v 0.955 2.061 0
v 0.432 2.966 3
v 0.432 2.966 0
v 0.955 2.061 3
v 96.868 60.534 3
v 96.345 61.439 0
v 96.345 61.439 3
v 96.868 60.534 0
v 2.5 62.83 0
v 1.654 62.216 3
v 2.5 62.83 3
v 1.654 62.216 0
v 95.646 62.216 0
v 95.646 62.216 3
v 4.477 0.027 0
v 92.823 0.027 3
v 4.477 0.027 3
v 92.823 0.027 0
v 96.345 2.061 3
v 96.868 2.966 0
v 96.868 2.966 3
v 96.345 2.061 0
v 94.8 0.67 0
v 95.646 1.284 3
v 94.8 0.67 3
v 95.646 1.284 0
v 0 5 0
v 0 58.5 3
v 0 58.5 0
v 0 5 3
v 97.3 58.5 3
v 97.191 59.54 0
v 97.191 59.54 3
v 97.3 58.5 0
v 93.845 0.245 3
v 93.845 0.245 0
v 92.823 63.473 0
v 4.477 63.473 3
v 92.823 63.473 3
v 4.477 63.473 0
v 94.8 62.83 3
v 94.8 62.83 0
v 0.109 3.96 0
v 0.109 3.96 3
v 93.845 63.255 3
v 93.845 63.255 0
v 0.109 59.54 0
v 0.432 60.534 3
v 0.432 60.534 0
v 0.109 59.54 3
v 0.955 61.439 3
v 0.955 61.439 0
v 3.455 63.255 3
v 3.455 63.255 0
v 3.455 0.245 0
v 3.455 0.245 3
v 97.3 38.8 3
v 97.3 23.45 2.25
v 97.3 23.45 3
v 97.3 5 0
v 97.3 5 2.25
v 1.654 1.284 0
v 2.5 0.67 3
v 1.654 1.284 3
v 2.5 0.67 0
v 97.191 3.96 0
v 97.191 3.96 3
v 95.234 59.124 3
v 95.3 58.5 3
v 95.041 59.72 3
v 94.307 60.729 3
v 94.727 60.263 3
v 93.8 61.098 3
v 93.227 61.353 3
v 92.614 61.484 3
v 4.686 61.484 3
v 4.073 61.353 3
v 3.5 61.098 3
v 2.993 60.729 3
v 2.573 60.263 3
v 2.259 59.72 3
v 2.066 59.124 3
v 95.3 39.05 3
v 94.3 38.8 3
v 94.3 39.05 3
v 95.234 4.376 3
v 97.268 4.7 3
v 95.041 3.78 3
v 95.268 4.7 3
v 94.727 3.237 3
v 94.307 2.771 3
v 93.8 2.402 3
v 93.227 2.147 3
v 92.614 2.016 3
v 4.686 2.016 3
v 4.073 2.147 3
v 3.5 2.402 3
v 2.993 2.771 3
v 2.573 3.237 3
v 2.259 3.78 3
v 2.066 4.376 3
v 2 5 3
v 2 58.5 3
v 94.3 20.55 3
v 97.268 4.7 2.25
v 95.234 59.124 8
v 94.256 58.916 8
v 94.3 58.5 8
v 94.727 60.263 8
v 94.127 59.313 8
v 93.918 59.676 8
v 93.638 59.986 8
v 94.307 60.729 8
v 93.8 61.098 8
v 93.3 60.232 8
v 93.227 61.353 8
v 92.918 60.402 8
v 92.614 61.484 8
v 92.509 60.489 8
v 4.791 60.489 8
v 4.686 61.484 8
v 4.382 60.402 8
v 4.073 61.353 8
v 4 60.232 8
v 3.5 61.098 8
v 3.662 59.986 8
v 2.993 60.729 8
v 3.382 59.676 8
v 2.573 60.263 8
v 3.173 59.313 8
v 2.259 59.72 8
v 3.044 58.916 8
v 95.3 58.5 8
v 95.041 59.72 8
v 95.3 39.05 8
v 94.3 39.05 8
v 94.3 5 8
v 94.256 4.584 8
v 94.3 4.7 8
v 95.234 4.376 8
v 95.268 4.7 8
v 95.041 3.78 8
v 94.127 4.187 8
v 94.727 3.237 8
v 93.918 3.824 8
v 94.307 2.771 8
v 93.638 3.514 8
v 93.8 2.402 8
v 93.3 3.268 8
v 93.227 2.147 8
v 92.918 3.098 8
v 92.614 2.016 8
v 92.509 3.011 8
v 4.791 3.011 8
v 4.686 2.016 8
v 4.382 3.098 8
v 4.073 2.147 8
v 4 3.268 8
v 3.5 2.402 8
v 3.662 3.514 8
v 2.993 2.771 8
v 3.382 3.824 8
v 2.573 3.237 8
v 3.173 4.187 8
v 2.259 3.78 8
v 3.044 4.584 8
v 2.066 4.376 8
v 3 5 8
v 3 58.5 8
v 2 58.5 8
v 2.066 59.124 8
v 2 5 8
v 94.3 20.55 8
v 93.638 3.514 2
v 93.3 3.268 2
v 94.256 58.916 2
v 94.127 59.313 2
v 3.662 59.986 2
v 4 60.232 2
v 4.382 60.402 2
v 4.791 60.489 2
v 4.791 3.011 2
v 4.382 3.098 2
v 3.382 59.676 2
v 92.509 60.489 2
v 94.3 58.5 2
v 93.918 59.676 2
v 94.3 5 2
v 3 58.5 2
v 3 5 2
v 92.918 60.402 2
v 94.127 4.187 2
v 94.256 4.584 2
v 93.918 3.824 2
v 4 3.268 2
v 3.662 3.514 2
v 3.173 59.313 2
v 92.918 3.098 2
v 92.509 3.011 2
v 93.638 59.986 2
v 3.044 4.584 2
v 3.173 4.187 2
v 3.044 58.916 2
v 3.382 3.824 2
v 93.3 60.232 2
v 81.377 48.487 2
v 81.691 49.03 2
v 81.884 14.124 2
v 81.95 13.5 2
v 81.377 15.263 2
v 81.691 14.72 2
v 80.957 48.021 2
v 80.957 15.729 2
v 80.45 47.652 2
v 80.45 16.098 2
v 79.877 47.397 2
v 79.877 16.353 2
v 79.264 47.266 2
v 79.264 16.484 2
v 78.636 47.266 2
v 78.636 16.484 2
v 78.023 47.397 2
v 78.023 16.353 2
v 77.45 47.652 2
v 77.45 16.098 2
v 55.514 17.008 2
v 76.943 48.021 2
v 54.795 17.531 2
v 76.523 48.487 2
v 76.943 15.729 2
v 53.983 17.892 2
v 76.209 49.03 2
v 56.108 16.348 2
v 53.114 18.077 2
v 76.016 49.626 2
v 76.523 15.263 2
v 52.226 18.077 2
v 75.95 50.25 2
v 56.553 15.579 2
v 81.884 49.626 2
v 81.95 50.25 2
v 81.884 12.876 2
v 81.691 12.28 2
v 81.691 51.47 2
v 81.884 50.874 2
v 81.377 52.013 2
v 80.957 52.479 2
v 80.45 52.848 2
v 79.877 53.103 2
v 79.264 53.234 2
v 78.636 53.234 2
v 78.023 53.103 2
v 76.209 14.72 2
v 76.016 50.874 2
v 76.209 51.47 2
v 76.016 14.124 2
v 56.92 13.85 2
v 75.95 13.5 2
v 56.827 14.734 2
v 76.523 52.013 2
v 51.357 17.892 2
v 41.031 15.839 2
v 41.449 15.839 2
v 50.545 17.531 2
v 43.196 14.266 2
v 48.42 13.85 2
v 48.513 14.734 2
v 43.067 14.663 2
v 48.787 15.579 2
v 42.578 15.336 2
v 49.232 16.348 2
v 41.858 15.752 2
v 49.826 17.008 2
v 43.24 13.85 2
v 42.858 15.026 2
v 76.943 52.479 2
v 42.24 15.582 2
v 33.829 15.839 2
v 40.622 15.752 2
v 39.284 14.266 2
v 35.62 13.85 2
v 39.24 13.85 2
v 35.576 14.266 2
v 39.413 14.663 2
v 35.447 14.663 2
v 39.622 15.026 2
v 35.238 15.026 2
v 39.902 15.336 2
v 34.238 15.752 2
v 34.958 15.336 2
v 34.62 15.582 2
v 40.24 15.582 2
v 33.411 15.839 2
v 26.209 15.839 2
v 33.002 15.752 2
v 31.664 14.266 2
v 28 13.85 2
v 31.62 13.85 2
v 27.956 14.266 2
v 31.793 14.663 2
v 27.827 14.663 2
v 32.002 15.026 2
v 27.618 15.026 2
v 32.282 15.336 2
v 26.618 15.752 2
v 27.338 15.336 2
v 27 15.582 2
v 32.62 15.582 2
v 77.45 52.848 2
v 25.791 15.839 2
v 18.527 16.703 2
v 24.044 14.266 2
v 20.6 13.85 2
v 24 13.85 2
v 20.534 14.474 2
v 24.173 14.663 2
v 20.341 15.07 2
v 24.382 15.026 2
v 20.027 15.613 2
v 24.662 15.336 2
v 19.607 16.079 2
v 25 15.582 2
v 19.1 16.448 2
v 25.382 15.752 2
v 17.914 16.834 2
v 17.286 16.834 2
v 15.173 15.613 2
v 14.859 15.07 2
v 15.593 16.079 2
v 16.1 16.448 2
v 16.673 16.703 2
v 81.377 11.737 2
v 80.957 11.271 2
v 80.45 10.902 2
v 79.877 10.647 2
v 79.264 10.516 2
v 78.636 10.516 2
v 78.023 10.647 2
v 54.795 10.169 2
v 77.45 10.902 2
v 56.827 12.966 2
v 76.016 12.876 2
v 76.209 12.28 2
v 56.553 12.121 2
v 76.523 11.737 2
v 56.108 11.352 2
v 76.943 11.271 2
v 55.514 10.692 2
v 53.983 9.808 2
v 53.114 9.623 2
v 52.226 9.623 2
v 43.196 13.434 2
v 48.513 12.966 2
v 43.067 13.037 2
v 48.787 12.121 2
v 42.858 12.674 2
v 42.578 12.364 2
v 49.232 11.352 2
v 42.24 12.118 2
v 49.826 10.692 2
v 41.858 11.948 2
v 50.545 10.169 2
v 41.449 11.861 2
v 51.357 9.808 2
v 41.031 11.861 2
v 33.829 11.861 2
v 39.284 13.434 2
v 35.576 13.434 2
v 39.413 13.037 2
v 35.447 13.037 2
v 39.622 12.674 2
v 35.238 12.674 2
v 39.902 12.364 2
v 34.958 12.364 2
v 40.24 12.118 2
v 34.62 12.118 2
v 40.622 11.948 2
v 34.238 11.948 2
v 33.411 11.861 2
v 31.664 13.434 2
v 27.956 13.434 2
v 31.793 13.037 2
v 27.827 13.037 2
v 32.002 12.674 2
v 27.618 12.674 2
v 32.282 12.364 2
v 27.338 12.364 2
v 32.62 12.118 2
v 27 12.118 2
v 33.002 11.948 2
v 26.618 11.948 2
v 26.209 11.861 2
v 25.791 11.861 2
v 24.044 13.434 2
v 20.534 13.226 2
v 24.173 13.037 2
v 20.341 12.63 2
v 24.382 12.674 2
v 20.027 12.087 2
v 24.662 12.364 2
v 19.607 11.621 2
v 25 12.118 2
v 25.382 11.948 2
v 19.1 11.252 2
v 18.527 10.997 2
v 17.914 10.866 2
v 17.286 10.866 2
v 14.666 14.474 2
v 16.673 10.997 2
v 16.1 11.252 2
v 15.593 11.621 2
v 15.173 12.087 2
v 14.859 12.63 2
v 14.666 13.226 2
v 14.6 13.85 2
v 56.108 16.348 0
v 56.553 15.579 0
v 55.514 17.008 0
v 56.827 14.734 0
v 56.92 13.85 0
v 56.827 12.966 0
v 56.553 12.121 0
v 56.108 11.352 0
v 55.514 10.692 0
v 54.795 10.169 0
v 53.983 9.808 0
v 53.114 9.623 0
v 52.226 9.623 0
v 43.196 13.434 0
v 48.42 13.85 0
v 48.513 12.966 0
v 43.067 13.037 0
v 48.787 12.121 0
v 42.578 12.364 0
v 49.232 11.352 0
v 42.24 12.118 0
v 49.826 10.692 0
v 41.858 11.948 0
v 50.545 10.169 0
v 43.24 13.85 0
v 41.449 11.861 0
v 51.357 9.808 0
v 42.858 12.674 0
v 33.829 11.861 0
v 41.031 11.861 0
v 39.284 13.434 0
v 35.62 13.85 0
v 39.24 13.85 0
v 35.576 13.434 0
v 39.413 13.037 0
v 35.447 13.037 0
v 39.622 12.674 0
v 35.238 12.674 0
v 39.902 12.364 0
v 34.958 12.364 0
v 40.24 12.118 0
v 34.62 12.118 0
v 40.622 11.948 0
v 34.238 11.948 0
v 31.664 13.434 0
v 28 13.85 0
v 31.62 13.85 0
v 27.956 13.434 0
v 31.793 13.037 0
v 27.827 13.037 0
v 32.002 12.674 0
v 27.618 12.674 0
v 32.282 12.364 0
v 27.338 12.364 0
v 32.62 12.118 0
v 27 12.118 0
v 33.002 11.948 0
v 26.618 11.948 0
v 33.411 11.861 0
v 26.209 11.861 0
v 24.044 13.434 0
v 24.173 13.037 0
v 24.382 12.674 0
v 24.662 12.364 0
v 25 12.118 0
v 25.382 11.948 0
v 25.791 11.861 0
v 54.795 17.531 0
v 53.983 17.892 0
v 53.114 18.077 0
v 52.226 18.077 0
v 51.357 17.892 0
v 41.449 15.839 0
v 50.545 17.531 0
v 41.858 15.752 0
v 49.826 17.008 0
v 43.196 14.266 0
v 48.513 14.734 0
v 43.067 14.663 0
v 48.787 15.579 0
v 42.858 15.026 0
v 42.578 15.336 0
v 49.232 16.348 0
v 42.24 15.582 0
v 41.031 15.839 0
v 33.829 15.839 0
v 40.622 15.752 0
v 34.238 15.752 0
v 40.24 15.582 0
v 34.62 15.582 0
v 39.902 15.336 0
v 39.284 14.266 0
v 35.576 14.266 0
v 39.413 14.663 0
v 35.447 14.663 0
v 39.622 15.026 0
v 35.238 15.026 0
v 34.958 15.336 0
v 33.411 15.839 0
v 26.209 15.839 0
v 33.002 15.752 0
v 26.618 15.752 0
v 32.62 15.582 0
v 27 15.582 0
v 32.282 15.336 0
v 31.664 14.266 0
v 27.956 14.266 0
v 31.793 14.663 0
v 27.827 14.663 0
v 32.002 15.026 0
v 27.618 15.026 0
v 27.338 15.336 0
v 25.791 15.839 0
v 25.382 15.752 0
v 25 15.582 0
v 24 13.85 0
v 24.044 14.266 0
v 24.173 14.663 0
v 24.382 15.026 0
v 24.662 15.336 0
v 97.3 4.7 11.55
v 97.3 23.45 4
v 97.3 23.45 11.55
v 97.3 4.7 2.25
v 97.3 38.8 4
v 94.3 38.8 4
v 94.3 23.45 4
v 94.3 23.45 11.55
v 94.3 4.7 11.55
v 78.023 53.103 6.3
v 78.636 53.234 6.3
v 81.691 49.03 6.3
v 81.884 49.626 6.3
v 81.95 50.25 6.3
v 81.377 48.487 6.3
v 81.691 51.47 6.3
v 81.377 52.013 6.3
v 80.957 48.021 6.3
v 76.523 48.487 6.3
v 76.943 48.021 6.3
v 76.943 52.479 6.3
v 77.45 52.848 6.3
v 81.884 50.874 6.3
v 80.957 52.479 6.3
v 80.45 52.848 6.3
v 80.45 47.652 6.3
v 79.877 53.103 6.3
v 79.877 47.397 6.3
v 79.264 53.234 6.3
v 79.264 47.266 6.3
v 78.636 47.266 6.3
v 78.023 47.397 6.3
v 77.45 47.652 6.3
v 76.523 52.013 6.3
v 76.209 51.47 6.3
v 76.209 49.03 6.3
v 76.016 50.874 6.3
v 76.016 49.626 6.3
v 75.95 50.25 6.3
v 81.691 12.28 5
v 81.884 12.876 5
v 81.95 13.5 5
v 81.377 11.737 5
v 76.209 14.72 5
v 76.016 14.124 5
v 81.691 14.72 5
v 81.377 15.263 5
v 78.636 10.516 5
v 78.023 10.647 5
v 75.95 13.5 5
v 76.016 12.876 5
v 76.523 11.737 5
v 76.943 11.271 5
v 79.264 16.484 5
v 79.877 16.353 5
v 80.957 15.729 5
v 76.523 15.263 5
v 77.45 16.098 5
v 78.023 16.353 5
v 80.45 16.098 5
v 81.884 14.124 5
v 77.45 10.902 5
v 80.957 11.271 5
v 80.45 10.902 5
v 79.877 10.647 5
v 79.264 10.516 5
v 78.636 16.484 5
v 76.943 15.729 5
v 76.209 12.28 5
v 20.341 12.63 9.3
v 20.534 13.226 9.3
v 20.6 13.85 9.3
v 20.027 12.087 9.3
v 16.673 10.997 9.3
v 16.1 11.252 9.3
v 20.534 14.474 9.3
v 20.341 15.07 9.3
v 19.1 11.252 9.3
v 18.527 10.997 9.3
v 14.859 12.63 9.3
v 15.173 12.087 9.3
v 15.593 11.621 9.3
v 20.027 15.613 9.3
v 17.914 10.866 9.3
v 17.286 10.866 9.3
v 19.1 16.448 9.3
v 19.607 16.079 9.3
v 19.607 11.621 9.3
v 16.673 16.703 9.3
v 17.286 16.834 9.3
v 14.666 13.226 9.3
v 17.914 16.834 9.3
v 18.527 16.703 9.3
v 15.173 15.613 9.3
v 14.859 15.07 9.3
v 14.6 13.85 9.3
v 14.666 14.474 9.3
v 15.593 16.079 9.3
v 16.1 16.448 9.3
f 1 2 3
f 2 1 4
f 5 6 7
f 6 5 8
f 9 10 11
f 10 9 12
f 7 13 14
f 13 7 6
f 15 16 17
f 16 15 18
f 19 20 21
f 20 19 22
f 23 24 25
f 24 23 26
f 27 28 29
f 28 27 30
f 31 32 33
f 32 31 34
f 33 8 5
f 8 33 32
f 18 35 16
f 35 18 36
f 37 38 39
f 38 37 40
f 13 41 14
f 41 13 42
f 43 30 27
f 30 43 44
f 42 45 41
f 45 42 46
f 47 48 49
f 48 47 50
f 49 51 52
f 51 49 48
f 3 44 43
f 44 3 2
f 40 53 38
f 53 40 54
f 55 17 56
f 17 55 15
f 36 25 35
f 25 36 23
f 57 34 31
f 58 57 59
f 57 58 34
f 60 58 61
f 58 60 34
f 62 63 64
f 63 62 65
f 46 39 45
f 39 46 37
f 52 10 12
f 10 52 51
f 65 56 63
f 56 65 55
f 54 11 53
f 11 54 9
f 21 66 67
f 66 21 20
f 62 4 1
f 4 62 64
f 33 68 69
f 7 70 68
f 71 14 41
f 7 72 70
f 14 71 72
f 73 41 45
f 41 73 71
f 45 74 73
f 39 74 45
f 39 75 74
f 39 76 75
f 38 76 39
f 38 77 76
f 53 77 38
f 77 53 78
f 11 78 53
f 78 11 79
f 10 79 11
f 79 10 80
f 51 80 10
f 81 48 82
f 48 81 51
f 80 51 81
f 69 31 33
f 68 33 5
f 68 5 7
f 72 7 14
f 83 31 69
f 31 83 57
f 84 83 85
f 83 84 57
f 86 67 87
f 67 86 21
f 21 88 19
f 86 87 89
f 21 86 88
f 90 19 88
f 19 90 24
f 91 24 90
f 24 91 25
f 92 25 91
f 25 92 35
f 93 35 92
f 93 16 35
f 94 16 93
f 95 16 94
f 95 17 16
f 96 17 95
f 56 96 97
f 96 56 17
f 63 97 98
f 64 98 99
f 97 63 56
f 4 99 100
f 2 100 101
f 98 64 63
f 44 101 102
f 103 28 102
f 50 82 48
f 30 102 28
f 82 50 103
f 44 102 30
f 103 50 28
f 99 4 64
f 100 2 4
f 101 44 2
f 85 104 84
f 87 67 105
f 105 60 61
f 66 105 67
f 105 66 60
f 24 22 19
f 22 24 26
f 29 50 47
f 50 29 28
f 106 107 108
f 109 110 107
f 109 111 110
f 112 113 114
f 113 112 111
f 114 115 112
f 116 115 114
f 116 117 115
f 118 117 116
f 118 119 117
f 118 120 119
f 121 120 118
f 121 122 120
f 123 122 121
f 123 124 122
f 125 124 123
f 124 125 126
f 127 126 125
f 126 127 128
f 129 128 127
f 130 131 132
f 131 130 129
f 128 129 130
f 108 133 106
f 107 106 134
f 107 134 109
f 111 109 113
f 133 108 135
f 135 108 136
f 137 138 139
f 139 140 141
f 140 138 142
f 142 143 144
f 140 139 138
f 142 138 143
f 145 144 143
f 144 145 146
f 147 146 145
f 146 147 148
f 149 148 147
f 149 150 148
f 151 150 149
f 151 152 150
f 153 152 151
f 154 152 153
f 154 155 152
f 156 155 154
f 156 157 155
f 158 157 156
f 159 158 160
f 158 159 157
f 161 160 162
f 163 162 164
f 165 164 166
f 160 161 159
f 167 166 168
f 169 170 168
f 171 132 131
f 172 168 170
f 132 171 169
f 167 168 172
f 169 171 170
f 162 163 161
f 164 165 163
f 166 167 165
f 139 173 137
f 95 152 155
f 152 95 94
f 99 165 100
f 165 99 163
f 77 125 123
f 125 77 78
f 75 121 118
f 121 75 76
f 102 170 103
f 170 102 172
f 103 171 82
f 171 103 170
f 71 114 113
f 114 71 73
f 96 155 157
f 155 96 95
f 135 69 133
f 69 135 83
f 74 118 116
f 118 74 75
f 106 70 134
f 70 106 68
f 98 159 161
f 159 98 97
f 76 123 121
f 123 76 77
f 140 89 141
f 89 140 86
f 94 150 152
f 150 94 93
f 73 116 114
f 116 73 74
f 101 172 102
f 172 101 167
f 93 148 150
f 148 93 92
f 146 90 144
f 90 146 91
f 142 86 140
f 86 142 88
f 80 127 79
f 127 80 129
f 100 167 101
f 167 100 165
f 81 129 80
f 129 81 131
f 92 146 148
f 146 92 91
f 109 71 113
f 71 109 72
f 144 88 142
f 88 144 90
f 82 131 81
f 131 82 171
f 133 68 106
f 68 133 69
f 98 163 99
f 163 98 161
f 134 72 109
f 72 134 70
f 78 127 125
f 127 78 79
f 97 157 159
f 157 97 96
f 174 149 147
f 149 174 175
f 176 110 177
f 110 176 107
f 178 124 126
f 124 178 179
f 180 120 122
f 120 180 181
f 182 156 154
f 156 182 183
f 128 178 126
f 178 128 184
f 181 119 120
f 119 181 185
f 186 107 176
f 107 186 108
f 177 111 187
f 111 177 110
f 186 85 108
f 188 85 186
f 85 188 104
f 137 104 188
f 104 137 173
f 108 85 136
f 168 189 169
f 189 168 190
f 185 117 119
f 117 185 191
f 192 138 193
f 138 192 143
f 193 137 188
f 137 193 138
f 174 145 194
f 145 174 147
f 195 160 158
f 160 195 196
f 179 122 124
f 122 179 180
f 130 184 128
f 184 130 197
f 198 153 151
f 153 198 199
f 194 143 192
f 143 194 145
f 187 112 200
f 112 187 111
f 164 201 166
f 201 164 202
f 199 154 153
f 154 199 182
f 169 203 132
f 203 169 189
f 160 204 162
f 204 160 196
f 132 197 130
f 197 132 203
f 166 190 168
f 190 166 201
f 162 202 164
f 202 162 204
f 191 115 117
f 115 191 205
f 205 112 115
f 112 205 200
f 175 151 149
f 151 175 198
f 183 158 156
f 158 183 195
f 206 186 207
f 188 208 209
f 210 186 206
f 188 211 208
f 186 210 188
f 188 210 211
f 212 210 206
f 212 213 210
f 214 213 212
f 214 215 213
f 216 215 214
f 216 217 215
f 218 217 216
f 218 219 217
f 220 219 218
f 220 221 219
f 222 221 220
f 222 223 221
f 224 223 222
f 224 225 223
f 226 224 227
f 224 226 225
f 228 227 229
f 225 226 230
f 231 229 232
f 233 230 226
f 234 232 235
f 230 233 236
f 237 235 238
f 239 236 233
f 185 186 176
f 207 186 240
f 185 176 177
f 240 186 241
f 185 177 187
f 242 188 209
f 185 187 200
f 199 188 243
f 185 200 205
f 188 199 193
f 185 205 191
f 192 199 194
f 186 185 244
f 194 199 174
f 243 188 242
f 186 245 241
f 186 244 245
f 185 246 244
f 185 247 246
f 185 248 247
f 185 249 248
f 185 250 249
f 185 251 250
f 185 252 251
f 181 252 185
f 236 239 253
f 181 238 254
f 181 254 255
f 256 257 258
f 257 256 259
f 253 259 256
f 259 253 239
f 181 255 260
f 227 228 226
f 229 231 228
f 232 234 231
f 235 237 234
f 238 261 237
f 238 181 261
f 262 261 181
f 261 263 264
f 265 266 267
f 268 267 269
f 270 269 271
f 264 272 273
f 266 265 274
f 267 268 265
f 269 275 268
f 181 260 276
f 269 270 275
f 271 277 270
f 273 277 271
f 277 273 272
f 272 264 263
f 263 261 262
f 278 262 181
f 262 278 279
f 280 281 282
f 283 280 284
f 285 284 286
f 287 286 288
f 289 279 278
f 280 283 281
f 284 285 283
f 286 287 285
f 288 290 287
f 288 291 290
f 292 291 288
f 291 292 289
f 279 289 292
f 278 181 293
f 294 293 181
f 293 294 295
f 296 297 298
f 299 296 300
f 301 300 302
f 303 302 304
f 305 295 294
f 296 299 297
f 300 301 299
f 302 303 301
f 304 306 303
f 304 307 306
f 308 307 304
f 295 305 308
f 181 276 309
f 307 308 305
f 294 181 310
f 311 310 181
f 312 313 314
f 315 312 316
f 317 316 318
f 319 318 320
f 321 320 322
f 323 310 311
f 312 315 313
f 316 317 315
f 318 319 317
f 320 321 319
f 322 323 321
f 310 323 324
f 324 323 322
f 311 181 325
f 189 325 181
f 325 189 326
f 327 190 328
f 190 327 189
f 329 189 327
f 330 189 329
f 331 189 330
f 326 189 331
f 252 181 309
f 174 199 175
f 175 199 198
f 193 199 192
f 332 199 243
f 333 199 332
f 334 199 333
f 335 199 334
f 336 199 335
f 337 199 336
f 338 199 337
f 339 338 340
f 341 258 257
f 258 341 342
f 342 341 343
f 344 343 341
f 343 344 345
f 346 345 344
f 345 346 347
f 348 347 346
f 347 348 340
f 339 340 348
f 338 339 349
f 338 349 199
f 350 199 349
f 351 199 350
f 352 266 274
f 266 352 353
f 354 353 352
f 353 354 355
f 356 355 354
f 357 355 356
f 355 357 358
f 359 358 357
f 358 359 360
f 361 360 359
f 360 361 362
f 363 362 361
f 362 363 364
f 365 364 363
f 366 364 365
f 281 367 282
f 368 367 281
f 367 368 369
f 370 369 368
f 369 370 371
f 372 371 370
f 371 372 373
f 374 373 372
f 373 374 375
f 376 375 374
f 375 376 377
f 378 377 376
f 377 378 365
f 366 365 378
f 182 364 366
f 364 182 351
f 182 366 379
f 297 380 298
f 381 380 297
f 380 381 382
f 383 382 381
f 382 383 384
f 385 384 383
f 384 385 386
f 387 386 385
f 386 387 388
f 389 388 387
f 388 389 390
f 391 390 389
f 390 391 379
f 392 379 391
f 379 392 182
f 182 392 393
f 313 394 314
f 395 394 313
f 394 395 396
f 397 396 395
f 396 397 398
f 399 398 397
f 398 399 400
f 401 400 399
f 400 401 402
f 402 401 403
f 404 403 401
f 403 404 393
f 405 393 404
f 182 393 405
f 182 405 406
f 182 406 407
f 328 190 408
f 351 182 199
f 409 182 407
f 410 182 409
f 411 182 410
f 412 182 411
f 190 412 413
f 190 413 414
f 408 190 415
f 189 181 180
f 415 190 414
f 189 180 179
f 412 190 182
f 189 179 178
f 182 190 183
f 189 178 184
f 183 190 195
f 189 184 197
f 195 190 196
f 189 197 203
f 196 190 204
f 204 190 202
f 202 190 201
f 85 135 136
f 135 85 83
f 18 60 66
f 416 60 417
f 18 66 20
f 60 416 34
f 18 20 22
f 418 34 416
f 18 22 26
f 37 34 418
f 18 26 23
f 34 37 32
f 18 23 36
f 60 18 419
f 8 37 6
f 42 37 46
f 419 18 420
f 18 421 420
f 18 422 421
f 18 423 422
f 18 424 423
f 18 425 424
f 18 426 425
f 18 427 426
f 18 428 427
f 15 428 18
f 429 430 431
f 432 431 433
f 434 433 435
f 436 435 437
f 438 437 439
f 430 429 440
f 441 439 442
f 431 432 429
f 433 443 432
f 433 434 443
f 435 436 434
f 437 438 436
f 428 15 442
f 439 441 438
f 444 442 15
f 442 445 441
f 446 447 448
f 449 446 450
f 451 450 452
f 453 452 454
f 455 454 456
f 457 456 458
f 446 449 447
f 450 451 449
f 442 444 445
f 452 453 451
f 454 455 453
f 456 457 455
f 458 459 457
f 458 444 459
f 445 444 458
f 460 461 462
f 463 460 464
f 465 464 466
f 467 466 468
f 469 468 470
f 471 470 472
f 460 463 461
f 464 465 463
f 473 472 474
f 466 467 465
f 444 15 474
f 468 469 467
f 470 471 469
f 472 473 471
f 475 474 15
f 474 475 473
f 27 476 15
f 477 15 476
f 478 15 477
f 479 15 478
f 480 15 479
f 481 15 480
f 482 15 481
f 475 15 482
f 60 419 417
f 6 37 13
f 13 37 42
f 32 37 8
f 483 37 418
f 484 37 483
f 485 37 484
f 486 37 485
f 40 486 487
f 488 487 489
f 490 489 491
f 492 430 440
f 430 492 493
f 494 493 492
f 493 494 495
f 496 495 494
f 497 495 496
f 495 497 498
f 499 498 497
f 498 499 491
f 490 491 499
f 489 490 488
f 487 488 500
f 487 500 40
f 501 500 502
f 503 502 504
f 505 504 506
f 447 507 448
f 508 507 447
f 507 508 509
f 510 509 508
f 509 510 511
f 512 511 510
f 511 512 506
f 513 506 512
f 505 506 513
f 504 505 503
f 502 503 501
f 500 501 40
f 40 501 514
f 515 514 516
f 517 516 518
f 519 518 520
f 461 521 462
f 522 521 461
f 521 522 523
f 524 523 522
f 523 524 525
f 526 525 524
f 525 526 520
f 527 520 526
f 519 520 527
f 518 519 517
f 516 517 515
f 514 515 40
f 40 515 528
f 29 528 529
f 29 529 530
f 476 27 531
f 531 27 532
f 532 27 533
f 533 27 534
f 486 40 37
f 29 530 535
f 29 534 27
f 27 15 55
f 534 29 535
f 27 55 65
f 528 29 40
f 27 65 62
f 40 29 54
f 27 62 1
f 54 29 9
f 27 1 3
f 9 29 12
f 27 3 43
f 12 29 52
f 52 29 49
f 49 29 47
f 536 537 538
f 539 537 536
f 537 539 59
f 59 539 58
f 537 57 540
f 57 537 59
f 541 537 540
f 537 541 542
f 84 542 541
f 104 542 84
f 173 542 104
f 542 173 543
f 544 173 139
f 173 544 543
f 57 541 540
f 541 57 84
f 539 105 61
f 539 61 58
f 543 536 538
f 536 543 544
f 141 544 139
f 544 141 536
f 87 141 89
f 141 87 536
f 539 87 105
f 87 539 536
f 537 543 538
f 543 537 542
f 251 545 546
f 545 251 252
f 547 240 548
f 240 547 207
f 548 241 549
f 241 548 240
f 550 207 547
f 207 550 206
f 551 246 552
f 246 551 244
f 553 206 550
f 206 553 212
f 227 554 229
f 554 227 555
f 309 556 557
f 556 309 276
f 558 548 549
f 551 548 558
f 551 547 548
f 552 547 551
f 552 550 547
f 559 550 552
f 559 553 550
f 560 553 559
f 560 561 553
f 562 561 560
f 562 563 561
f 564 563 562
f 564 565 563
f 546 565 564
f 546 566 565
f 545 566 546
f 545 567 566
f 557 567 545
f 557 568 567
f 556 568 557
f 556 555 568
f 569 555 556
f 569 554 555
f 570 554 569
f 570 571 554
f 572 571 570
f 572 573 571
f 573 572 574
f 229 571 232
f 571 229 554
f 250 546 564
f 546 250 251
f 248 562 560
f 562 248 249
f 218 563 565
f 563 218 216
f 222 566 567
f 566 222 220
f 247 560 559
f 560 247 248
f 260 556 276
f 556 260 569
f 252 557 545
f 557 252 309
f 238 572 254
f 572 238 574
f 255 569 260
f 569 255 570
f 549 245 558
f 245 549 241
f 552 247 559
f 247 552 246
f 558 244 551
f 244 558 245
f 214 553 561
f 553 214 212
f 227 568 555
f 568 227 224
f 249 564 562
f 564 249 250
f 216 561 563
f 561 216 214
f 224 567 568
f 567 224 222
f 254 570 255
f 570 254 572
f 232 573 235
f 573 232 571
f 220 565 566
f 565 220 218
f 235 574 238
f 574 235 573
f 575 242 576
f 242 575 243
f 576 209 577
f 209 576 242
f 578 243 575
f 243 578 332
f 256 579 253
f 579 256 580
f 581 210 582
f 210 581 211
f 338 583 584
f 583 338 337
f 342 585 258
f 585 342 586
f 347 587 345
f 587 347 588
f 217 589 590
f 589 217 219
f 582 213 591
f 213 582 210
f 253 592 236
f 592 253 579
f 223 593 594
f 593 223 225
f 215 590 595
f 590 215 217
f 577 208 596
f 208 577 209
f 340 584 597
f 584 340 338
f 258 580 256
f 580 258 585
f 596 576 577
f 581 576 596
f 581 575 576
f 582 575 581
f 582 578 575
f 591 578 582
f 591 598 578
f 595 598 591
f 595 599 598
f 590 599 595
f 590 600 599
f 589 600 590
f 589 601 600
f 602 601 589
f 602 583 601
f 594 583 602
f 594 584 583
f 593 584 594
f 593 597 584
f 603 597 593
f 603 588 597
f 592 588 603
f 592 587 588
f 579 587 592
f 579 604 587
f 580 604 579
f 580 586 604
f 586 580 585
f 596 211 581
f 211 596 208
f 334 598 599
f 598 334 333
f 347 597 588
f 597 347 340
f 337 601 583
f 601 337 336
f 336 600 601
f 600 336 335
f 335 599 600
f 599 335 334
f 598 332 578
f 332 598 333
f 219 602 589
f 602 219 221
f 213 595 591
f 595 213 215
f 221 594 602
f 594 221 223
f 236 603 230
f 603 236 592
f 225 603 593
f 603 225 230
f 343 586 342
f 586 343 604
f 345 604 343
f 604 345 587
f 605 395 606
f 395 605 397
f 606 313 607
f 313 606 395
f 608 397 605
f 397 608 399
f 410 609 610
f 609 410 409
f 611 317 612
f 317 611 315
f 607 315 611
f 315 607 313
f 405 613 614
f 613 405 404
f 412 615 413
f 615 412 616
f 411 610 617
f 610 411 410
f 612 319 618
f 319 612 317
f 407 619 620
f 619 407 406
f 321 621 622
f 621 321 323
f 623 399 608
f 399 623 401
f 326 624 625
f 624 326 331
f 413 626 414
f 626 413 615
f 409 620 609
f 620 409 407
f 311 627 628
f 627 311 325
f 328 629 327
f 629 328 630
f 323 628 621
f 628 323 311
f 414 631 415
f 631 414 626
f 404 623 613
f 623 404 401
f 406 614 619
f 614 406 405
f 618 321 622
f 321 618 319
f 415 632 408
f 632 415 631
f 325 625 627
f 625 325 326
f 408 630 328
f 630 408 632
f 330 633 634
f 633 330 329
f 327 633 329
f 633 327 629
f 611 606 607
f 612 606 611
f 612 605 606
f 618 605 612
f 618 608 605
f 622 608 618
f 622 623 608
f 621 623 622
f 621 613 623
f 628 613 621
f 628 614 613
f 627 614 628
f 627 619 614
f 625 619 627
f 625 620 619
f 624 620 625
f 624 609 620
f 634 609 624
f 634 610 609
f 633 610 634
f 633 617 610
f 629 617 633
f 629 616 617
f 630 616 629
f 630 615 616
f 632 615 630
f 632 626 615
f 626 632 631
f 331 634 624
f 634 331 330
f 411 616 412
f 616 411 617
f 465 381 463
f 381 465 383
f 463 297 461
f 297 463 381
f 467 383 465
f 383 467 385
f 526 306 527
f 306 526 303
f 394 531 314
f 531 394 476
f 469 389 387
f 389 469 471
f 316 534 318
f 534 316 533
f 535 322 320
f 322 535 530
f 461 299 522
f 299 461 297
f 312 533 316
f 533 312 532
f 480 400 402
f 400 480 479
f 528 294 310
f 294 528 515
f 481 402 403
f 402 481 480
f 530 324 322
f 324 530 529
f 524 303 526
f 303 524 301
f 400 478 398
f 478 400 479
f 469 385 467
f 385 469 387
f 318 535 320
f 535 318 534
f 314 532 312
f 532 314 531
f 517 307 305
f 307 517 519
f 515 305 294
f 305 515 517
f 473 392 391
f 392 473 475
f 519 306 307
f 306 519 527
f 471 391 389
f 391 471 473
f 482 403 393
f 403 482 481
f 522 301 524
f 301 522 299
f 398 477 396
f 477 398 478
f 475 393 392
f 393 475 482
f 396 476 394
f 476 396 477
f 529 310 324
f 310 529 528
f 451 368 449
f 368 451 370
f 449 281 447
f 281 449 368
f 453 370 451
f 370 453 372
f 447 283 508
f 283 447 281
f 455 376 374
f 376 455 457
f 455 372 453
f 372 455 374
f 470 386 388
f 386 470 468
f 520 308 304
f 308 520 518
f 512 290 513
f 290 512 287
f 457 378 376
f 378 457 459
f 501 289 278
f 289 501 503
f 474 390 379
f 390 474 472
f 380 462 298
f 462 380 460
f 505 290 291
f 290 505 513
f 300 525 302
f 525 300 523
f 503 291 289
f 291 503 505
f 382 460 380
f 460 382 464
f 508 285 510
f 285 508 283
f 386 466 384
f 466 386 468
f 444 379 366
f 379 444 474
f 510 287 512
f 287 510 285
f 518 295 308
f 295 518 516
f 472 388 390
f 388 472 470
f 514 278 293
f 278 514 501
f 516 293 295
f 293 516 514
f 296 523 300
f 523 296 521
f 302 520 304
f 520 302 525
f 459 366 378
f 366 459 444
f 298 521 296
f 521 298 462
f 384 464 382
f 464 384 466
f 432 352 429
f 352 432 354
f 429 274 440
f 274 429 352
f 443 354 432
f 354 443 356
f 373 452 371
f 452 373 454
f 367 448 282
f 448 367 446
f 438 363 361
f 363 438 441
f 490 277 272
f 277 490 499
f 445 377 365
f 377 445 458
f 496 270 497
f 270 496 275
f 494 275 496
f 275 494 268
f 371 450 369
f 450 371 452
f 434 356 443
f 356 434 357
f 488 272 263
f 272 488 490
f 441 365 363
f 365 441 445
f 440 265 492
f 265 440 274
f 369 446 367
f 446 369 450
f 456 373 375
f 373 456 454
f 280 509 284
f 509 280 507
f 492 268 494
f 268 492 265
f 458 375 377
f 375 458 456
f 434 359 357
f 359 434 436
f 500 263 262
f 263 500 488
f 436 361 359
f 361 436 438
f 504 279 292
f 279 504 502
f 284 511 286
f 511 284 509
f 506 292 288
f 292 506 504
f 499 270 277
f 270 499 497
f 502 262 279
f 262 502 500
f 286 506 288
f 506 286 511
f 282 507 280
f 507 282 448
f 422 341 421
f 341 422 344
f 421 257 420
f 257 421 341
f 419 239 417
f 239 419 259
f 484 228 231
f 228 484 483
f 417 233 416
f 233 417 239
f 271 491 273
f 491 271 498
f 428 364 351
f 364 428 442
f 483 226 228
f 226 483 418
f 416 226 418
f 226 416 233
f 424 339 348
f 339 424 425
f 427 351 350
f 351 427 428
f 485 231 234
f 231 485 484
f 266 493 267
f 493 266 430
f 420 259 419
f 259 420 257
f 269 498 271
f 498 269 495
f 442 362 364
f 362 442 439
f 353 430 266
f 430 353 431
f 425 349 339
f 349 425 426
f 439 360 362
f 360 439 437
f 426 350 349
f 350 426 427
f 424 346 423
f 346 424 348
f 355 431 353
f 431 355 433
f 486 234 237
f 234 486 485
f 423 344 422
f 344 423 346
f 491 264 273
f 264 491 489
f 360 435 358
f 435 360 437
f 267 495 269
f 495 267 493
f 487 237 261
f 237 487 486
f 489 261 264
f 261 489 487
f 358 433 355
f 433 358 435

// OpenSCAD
// file: shapes.scad
// Advanced shapes
//
//	v 1.0 - 24/01/2015 - initial release (MD)
//	v 1.1 - 05/02/2014 - added half-sphere (MD)
//

module round_cube(x,y,z,r) {
	hull() {
		translate([r, r, 0]) 		cylinder(h = z, r = r) ; 
		translate([r, y - r, 0]) 		cylinder(h = z, r = r) ; 
		translate([x - r, r, 0]) 		cylinder(h = z, r = r) ; 
		translate([x - r, y - r, 0]) 	cylinder(h = z, r = r) ; 
	}
}

module round_belt(x,y,z,r,t) {
	// x, y, z, r are outer dimensions, thickness t is inwards
	difference() {
		round_cube(x, y, z, r) ;
		translate([t, t, 0]) round_cube(x-2*t, y-2*t, z, r-t) ;
	}
}

module spacers(x1,x2,y1,y2,z,r) {
	translate([x1, y1, 0]) 	cylinder(h = z, r = r) ; 
	translate([x1, y2, 0]) 	cylinder(h = z, r = r) ; 
	translate([x2, y1, 0]) 	cylinder(h = z, r = r) ; 
	translate([x2, y2, 0])	cylinder(h = z, r = r) ; 
}

module truncated_square_pyramid(x1,y1,x2,y2,z) {
	dx = (x1-x2)/2 ;
	dy = (y1-y2)/2 ;
	ax = 90 - atan2(z, dx) ;
	ay = 90 - atan2(z, dy) ;
	
	difference() {
		translate([0, 0, z/2])  cube(size=[x1,y1,z], center=true) ; 
		union() {
			translate([-x1/2, 0, 0]) 	 rotate([0, ax, 0]) 
				translate([-x1/2, 0, z]) cube(size=[x1,y1,2*z], center=true) ; 
			translate([ x1/2, 0, 0]) 	 rotate([0, -ax, 0]) 
				translate([ x1/2, 0, z]) cube(size=[x1,y1,2*z], center=true) ; 
			translate([0, -y1/2, 0]) 	 rotate([-ay, 0, 0]) 
				translate([0, -y1/2, z]) cube(size=[x1,y1,2*z], center=true) ;
			translate([0,  y1/2, 0]) 	 rotate([ ay, 0, 0]) 
				translate([0,  y1/2, z]) cube(size=[x1,y1,2*z], center=true) ;
		}
	}
}

module halfsphere( r) {
	difference() {
		sphere (r = r) ; 
		translate([0, 0, -r/2]) 
			cube(size=[2*r, 2*r, r], center=true) ;
	}	
}

// --- end of file ---
// main file
// raspberry pi model b+ case
//
//	v 1.3 - 29/01/2015 - initial release + corrections (Marc Durvaux)
//  v 1.4 - 06/02/2015 - reduced Z clearance, hole opening for audio connector (audio_y),
//						added spacers on cover (MD)
//	v 1.5 - 08/02/2015 - fine tuning of connector hole Z position
//	v 1.7 - 10/02/2015 - fine tuning of holes, cutouts, spacers
//

// design control
test_fit = 0 ;		// set to one for test fit
top_bottom = 1 ;		// 0 = bottom only, 1 = top only, 2 = top & bottom
print = 1 ;			// set to one for printing configuration 

// parameters
$fn = 30 ;
tolerance = 0.50 ;		// 
wall_thickness  = 3.00 ;	// box wall thickness
rounding_radius = 5.00 ;	// box external wall corner rounding radius
cover_thickness = 3.00 ;	// box cover overall thickness at the edge
cover_inside_t  = 2.00 ;	// box cover material thickess
cover_overlap   = 5.00 ; // cover edge overlap height
edge_thickness  = 1.00 ;	// cover edge thickness (reduction in wall thickness)
clearance_z 	   = 2.00 ; // clearance on Z axis for daughter board
Top_spacer_r   = 3.00 ;  // radius of spacers on cover

//	Raspberry Pi dimensions (from mechanical specs, when available)
//		positions on PCB are from lower right corner (near power connector)
device_x = 85.00 ;		// pcb size exluding protruding connectors
device_y = 56.00 ;
device_z = 16.80 ;		// overall size, excluding bottom solders and USB connector top edge
riser_z  =  2.00 ;		// riser to cope with PCP bottom solders, located under PCB hole
riser_r  =  2.50 ; 		// riser radius (PCB mask hole radius = 3.1)
hole_x1  =  3.50 ;		// hole center x offset from PCB edge (uSD side)
hole_x2  = 58.00 + hole_x1 ; 	// hole center x offset from PCB edge (uSD side)
hole_y   =  3.50 ; 		// hole center y offset from PCB edge
uSD_x    =  2.70 ; 		// uSD card protrusion
uSD_w	 = 11.00 ;		// uSD card width
uSD_y	 = device_y/2;	// uSD center y offset
PWR_w	 =  8.00 ;		// micro-USB power connector width
PWR_z	 =  3.00 ;		// micro-USB power connector height over PCB
PWR_x	 = 10.60 ;		// micro-USB power connector center X offset from PCB edge
PWRplug_w = 11.00 ;		// micro-USB power plug width (used for outside wall stamping)
PWRplug_h =  8.00 ; 		// micro-USB power plug height (used for outside wall stamping)
PWRplug_d =  2.00 ;		// micro-USB power plug outside wall stamping depth
//audio_y  =  2.70 ;		// audio connector protrusion (masked audio)
audio_y  =  2*wall_thickness ;	// open audio connector
audio_w  =  5.80 ;		// audio connector external diameter (width)
audio_z  =  6.50 ; 		// audio connector height over PCB
audio_x  = 53.50 ;   	// audio connector center X offset from PCB edge
hdmi_y   =  1.00 ;		// hdmi connector protrusion
hdmi_w	 = 15.00 ;		// hdmi connector width
hdmi_z   =  7.00	;		// hdmi connector height over PCB
hdmi_x   = 32.00 ;		// hdmi connector center X offset from PCB edge
Ether_x  =  2.60 ;		// Ethernet connector protrusion
Ether_w  = 15.60 ;		// Ethernet connector width
Ether_z  = 15.00 ;		// Ethernet connector height over PCB lower side
Ether_y  = 10.25 ; 		// Ethernet connector center Y offset from PCB edge
USB_x    =  2.60 ; 		// USB connectors protrusion
USB_w    = 15.10 ;		// USB connectors width
USB_z	 = 16.60 ;  		// USB connecotrs height over PCB
USBl_y	 = 29.00 ;  		// left USB connector center Y offset from PCB edge (near Ethernet connector) 
USBr_y	 = 47.00 ;  		// right USB connector center Y offset from PCB edge
LedBtn_y = device_y - hole_y - 2.5 * 2.54 + tolerance ;	// Y axis center position of LEDs and button(s)
R_Led_x  = hole_x1 + 29 + 2.54 + tolerance ;				// X axis center position of red LED
Y_Led_x  = R_Led_x - 3 * 2.54 ;				// X axis center position of yellow LED
G_Led_x  = R_Led_x - 6 * 2.54 ;				// X axis center position of green LED
Btn_x	 = R_Led_x + 4.5 * 2.54 ; 			// X axis center position of button
Led_r	 =  1.50 ;		// LED radius + margin
Btn_r    =  4.00 ;		// push button radius
PCB_z    = 12.00 ;		// Daughter board top side to main PCB bottom side


// inside box dimension
in_x = device_x + uSD_x + USB_x + 2 * tolerance ;
in_y = device_y + 3 * tolerance ;
in_z = device_z + riser_z + clearance_z ;	
in_r = rounding_radius - wall_thickness ;
pcb_top = riser_z + device_z - USB_z ; 	// the USB connector is the highest component
spacer_z = pcb_top + 2*tolerance ;		// spacer on uSD side

// outside box dimension
box_x = in_x + 2 * wall_thickness ;
box_y = in_y + 2 * wall_thickness ;
box_z = in_z + wall_thickness ;		// without cover
cover_z = cover_thickness + cover_overlap ;		// box cover height
edge_offset = wall_thickness - edge_thickness ;	// box cover edge offset
USB_sep = USBr_y - USBl_y - USB_w + tolerance ;	// separation between USB connectors
mask_z = clearance_z - 2 * tolerance ;			// USB connector mask, cover side

// cover spacer to hold PCB in place
USB_spacer   = cover_thickness + clearance_z ;
Eth_spacer   = cover_thickness + clearance_z + device_z - Ether_z - tolerance ;
Con_spacer_x = wall_thickness + uSD_x + (device_x + hole_x2) / 2 ; 	// USB and Ethernet connectors
PCB_spacer   = cover_thickness + clearance_z + device_z - PCB_z - tolerance ;
PCB_spacer_x = wall_thickness + uSD_x + (G_Led_x + hole_x1) / 2 ; 

// print dimensions for control
echo(box_x = box_x) ;
echo(box_y = box_y) ;
echo(box_z = box_z) ;
echo(cover_z = cover_z) ;
echo(in_x = in_x) ;
echo(in_y = in_y) ;
echo(in_z = in_z) ;
echo(G_Led_x = G_Led_x) ;
echo(USB_sep = USB_sep) ;
echo(cover_z = cover_z) ;
echo(USB_spacer = USB_spacer) ;
echo(Eth_spacer = Eth_spacer) ;
echo(Con_spacer_x = Con_spacer_x) ;
echo(PCB_spacer = PCB_spacer) ;
echo(PCB_spacer_x = PCB_spacer_x) ;


// create device
if (test_fit == 1) {
	// test fit
	box_bottom() ;
	translate([0, 0, box_z - cover_overlap]) box_top() ;
} else {
	if (top_bottom < 1) {
		box_bottom() ; 
	} else {
		if (print == 1) { translate([0, box_y, cover_z]) rotate([180,0,0]) box_top() ; }
		else { box_top() ; }
		if (top_bottom > 1) {
			translate([0, -100, 0]) 
				box_bottom() ;
		}
	}
}

// modules
include <shapes.scad>

module right_cutouts() {		// position from PCB lower left corner
	bezel = 4*PWRplug_d ;	// to limit overhang angle for manufacturing

	translate([ PWR_x - tolerance - PWR_w/2, 0, tolerance]) 
		cube([ PWR_w + 2*tolerance, wall_thickness + tolerance, PWR_z + 4*tolerance]); 	// power
	translate([PWR_x, 0, PWR_z/2 + 3*tolerance])	rotate ([-90, 0,0]) 	// stamping for power plug	
		truncated_square_pyramid(PWRplug_w + bezel,PWRplug_h + bezel,PWRplug_w,PWRplug_h,PWRplug_d) ;

	translate([ hdmi_x - tolerance - hdmi_w/2, wall_thickness - hdmi_y -2*tolerance, 3*tolerance]) 
		cube([ hdmi_w + 2*tolerance, hdmi_y + 3*tolerance, hdmi_z + tolerance]) ;		// hdmi
	translate([audio_x, wall_thickness + tolerance, audio_z - audio_w/2 + 2*tolerance]) { 
		rotate ([90, 0, 0]) 	cylinder(h = audio_y, r = audio_w/2 + 3*tolerance) ; } 	// audio
}

module back_cutouts() {		// position on back side from PCB on Y axis
	translate([0, USBl_y - USB_w/2, USB_z/2])			// upper-left USB
		cube([wall_thickness +tolerance, USB_w +USB_sep, 2*USB_z]) ;	// Z size large enough!
	
	translate([0, USBr_y - USB_w/2, 0])				// lower-right USB
		cube([wall_thickness +tolerance, USB_w + 3*tolerance, 2*USB_z]) ;	// Z size large enough!
}

module box_bottom() {
	difference () {
		union() {	// box + added structures
			// basic box
			difference(){	
				round_cube(box_x, box_y, box_z, rounding_radius) ;
				translate([wall_thickness, wall_thickness, wall_thickness])
					round_cube(in_x, in_y, in_z, in_r) ;
			}
		
			// add inside structure
			translate([wall_thickness, wall_thickness, wall_thickness]) union() {
				// add uSD side wall spacer
				difference() {	
					cube([uSD_x, in_y, spacer_z]) ;
					translate([0, uSD_y - uSD_w, 0])
						cube([uSD_x, 2*uSD_w, spacer_z]) ;
				}
	
				// add PCB spacers
				translate([uSD_x, 0, 0])
					spacers(hole_x1 + tolerance, hole_x2 + tolerance, 
							hole_y + tolerance, device_y - hole_y + tolerance, 
							riser_r, riser_z) ;
			}
		}
	
		// substract cutouts
		union() {
			translate([wall_thickness + uSD_x, 0, wall_thickness + pcb_top]) 
				right_cutouts() ;
			translate([box_x - wall_thickness, wall_thickness, wall_thickness + pcb_top + 3*tolerance])
				back_cutouts() ;
			translate([edge_offset, edge_offset, box_z - cover_overlap])
				round_cube(box_x - 2*edge_offset, box_y - 2*edge_offset, cover_overlap, 
																rounding_radius - edge_offset) ;
		}
	}
}

module box_top() {
	difference () {
		union() {
			// basic cover
			difference(){	
				round_cube(box_x, box_y, cover_z, rounding_radius) ;
				union() {
					translate([wall_thickness, wall_thickness, 0])
						round_cube(in_x, in_y, cover_z - cover_inside_t, in_r) ;
					translate([0, 0, 0])
						round_belt(box_x, box_y, cover_overlap, rounding_radius, edge_offset) ;
					// USB connector cut-out
					translate([box_x - wall_thickness, wall_thickness + USBl_y - USB_w/2, 0])		
						cube([wall_thickness, USBr_y - USBl_y + tolerance, cover_overlap]) ;
				}
			}

			// add connector covers
			translate([box_x - wall_thickness, wall_thickness, cover_overlap]) 
			//translate([box_x - wall_thickness, wall_thickness, 0]) 
				union() {
					translate([0, USBl_y - USB_w/2 + 0.5*tolerance, -mask_z])
						cube([wall_thickness, USBr_y - USBl_y + USB_w + tolerance, mask_z]) ;
					translate([0, USBl_y + USB_w/2 + tolerance, -(mask_z + USB_z/2)  + 1.5*tolerance])
						cube([wall_thickness, USB_sep + USB_w + 0.5*tolerance, mask_z + USB_z/2]) ;
				}

			// add spacers
			translate([Con_spacer_x, wall_thickness + Ether_y, cover_z - Eth_spacer]) 
				cylinder(h = Eth_spacer, r = Top_spacer_r) ;
			translate([Con_spacer_x, wall_thickness + USBr_y, cover_z - USB_spacer]) 
				cylinder(h = USB_spacer, r = Top_spacer_r) ;
			translate([PCB_spacer_x, wall_thickness + LedBtn_y, cover_z - PCB_spacer]) 
				cylinder(h = PCB_spacer, r = Top_spacer_r) ;
			
		}

		// substract cutouts (holes for LEDs and push-button)
		translate([wall_thickness + uSD_x, wall_thickness, 0]) union() {
			translate([G_Led_x, LedBtn_y, 0])
				cylinder(h = cover_z, r = Led_r + tolerance) ;
			translate([Y_Led_x, LedBtn_y, 0])
				cylinder(h = cover_z, r = Led_r + tolerance) ;
			translate([R_Led_x, LedBtn_y, 0])
				cylinder(h = cover_z, r = Led_r + tolerance) ;
			translate([Btn_x,   LedBtn_y, 0])
				cylinder(h = cover_z, r = Btn_r + tolerance/2) ;
		}
	}
}

// --- end of file ---
